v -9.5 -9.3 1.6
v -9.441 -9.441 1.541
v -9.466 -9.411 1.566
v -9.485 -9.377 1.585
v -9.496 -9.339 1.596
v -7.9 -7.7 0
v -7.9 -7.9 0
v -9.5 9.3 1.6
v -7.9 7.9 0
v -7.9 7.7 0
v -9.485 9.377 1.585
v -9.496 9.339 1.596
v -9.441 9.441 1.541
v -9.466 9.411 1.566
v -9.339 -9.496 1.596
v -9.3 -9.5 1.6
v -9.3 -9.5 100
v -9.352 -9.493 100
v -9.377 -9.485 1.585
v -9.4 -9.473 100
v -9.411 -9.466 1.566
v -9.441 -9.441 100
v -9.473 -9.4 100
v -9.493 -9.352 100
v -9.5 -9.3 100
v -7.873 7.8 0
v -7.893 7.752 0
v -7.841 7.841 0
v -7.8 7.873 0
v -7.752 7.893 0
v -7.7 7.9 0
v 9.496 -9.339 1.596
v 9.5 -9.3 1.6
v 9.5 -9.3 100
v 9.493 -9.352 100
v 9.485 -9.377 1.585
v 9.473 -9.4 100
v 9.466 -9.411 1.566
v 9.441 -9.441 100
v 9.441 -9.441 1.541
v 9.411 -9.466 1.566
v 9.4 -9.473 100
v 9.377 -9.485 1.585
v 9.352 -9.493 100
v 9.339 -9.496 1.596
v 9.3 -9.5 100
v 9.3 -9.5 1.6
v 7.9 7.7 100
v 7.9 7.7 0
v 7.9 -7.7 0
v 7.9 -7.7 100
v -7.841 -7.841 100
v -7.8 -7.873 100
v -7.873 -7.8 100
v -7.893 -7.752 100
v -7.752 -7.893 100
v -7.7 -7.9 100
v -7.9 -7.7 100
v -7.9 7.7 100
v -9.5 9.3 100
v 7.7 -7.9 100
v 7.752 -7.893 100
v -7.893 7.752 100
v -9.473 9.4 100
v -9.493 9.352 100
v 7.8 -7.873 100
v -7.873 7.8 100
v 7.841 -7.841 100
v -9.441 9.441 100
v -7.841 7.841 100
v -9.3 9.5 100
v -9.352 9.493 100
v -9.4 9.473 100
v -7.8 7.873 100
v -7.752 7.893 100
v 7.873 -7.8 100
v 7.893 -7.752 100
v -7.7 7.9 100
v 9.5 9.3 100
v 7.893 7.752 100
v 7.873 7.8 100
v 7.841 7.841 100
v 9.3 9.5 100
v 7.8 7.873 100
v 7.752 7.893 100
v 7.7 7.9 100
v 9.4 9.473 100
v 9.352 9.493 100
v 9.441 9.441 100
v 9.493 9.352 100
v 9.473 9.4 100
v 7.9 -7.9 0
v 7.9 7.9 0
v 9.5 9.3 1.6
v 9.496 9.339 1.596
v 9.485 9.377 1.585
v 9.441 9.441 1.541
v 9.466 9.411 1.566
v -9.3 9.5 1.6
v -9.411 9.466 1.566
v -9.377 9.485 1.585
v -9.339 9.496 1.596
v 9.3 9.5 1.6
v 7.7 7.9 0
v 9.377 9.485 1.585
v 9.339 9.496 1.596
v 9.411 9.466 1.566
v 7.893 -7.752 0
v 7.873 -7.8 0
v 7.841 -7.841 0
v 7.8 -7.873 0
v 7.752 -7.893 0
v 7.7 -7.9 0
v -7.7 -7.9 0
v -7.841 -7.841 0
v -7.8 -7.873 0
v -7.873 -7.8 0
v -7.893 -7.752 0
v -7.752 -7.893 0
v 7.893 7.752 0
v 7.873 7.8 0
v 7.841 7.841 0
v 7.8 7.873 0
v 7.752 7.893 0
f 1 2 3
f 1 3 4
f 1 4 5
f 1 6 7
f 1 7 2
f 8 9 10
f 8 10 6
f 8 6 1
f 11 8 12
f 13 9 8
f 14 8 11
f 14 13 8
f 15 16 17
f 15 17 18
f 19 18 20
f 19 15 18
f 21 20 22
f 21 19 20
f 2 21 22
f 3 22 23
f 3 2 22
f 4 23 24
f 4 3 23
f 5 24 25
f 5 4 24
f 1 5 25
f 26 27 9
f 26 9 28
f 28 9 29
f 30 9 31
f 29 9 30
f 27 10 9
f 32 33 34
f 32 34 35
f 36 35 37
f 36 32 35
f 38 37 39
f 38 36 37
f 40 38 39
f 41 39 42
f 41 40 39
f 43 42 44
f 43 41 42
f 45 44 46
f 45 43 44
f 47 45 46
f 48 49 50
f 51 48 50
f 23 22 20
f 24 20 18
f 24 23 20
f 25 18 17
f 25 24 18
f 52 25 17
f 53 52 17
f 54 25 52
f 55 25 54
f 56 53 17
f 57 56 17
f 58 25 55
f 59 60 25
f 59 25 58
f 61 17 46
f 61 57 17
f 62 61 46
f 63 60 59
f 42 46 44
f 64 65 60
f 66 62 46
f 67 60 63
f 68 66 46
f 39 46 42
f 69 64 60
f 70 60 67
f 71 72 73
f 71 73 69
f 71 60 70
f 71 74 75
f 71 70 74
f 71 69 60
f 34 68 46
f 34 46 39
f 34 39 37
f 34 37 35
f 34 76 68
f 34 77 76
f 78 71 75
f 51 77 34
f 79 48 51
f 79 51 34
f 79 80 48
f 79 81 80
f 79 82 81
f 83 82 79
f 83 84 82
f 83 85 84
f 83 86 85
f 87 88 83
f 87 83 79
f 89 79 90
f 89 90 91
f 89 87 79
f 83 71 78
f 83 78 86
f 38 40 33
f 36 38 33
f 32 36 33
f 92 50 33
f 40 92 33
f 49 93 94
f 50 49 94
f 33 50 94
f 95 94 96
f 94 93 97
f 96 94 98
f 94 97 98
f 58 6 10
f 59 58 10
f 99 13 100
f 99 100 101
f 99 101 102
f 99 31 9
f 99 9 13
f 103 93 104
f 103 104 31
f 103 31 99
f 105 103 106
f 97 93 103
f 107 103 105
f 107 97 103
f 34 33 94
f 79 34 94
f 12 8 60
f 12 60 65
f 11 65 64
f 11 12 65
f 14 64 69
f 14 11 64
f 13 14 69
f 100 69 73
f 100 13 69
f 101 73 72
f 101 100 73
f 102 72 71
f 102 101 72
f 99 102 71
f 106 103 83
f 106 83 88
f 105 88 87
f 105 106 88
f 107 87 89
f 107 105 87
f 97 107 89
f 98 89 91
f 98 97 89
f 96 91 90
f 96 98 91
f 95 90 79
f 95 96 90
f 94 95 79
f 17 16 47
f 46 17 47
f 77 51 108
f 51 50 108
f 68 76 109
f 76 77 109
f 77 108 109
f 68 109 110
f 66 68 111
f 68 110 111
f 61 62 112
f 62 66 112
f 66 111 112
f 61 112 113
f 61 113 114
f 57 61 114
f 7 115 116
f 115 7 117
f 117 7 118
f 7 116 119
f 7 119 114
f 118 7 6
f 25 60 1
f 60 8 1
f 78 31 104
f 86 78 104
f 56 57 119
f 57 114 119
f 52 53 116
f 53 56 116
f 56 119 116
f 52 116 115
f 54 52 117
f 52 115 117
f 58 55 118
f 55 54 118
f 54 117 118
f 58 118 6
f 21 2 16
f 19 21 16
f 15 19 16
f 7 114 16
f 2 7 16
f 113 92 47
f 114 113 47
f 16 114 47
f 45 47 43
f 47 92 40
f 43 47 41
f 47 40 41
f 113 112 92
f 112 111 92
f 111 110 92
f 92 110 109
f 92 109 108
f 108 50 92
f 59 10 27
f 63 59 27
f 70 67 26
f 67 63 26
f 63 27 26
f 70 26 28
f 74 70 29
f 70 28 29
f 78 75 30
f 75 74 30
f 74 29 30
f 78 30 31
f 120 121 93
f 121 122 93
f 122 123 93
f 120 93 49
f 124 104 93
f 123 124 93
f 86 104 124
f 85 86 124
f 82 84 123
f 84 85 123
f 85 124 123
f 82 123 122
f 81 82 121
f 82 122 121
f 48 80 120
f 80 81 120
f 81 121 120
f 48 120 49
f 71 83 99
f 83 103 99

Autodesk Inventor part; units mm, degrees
ref_plane "YZ Plane" through (0, 0, 0) normal (1, 0, 0) x (0, 1, 0)
ref_plane "XZ Plane" through (0, 0, 0) normal (0, 1, 0) x (-1, 0, 0)
ref_plane "XY Plane" through (0, 0, 0) normal (0, 0, 1) x (1, 0, 0)
sketch "Sketch1" plane through (0, 0, 0) normal (0, 0, 1) x (1, 0, 0)
  line L0 (-9.3, -9.5) -> (9.3, -9.5)
  line L1 (9.5, -9.3) -> (9.5, 9.3)
  line L2 (9.3, 9.5) -> (-9.3, 9.5)
  line L3 (-9.5, 9.3) -> (-9.5, -9.3)
  line L4 (-9.5, -9.5) -> (9.5, 9.5) construction
  line L5 (9.5, -9.5) -> (-9.5, 9.5) construction
  line L6 (-7.7, 7.9) -> (7.7, 7.9)
  line L7 (7.9, 7.7) -> (7.9, -7.7)
  line L8 (7.7, -7.9) -> (-7.7, -7.9)
  line L9 (-7.9, -7.7) -> (-7.9, 7.7)
  arc A0 (-7.7, 7.9) -> (-7.9, 7.7) centre (-7.7, 7.7) ccw
  arc A1 (-7.9, -7.7) -> (-7.7, -7.9) centre (-7.7, -7.7) ccw
  arc A2 (7.7, -7.9) -> (7.9, -7.7) centre (7.7, -7.7) ccw
  arc A3 (7.9, 7.7) -> (7.7, 7.9) centre (7.7, 7.7) ccw
  arc A4 (-9.3, 9.5) -> (-9.5, 9.3) centre (-9.3, 9.3) ccw
  arc A5 (-9.5, -9.3) -> (-9.3, -9.5) centre (-9.3, -9.3) ccw
  arc A6 (9.3, -9.5) -> (9.5, -9.3) centre (9.3, -9.3) ccw
  arc A7 (9.5, 9.3) -> (9.3, 9.5) centre (9.3, 9.3) ccw
  point P0 (0, 0)
  dimension "d0" = 19
  dimension "d1" = 19
  dimension "d2" = 1.6
  dimension "d3" = 0.2
  dimension "d4" = 0.2
  dimension "d5" = 0.2
  dimension "d6" = 0.2
  dimension "d7" = 0.2
  dimension "d8" = 0.2
  dimension "d9" = 0.2
  dimension "d10" = 0.2
extrude "Extrusion1" add sketch "Sketch1" along normal blind 100
sketch "Sketch2" plane through (9.5, -9.3, 0) normal (1, 0, 0) x (0, 0, -1)
  line L0 (0, 17.2) -> (-1.6, 18.8)
  line L1 (0, 18.8) -> (-100, 18.8) projected
  line L2 (0, 17.2) -> (2.2627, 17.2) construction
  line L3 (-1.6, 18.8) -> (0, 18.8)
  line L4 (0, 18.8) -> (0, 17.2)
  line L5 (0, 1.4) -> (-100, 1.4) projected
  line L6 (0, 1.4) -> (-1.6, -0.2)
  line L7 (0, -0.2) -> (-100, -0.2) projected
  line L8 (0, 1.4) -> (2.2627, 1.4) construction
  line L9 (-1.6, -0.2) -> (0, -0.2)
  line L10 (0, -0.2) -> (0, 1.4)
  line L11 (0, 0) -> (0, 18.6) projected
  point P0 (0, 9.3)
  dimension "d13" = 135
  dimension "d14" = 135
extrude "Extrusion2" cut sketch "Sketch2" against normal through all
sketch "Sketch3" plane through (-9.3, 9.5, 100) normal (0, 1, 0) x (1, 0, 0)
  line L0 (1.3863, 100) -> (16.0747, 100) construction
  line L1 (-0.2, 98.6) -> (-0.2, 0) projected
  line L2 (18.8, 98.6) -> (18.8, 0) projected
  line L3 (1.4, 100) -> (-0.2, 98.4)
  line L4 (1.4, 100) -> (3.6627, 100) construction
  line L5 (-0.2, 98.4) -> (-0.2, 100)
  line L6 (-0.2, 100) -> (1.4, 100)
  line L7 (17.2, 100) -> (18.8, 98.4)
  line L8 (17.2, 100) -> (19.4627, 100) construction
  line L9 (18.8, 98.4) -> (18.8, 100)
  line L10 (18.8, 100) -> (17.2, 100)
  point P0 (9.3, 100)
  dimension "d18" = 135
  dimension "d19" = 45
extrude "Extrusion3" cut sketch "Sketch3" against normal through all
properties part number "WeldingDemo"
